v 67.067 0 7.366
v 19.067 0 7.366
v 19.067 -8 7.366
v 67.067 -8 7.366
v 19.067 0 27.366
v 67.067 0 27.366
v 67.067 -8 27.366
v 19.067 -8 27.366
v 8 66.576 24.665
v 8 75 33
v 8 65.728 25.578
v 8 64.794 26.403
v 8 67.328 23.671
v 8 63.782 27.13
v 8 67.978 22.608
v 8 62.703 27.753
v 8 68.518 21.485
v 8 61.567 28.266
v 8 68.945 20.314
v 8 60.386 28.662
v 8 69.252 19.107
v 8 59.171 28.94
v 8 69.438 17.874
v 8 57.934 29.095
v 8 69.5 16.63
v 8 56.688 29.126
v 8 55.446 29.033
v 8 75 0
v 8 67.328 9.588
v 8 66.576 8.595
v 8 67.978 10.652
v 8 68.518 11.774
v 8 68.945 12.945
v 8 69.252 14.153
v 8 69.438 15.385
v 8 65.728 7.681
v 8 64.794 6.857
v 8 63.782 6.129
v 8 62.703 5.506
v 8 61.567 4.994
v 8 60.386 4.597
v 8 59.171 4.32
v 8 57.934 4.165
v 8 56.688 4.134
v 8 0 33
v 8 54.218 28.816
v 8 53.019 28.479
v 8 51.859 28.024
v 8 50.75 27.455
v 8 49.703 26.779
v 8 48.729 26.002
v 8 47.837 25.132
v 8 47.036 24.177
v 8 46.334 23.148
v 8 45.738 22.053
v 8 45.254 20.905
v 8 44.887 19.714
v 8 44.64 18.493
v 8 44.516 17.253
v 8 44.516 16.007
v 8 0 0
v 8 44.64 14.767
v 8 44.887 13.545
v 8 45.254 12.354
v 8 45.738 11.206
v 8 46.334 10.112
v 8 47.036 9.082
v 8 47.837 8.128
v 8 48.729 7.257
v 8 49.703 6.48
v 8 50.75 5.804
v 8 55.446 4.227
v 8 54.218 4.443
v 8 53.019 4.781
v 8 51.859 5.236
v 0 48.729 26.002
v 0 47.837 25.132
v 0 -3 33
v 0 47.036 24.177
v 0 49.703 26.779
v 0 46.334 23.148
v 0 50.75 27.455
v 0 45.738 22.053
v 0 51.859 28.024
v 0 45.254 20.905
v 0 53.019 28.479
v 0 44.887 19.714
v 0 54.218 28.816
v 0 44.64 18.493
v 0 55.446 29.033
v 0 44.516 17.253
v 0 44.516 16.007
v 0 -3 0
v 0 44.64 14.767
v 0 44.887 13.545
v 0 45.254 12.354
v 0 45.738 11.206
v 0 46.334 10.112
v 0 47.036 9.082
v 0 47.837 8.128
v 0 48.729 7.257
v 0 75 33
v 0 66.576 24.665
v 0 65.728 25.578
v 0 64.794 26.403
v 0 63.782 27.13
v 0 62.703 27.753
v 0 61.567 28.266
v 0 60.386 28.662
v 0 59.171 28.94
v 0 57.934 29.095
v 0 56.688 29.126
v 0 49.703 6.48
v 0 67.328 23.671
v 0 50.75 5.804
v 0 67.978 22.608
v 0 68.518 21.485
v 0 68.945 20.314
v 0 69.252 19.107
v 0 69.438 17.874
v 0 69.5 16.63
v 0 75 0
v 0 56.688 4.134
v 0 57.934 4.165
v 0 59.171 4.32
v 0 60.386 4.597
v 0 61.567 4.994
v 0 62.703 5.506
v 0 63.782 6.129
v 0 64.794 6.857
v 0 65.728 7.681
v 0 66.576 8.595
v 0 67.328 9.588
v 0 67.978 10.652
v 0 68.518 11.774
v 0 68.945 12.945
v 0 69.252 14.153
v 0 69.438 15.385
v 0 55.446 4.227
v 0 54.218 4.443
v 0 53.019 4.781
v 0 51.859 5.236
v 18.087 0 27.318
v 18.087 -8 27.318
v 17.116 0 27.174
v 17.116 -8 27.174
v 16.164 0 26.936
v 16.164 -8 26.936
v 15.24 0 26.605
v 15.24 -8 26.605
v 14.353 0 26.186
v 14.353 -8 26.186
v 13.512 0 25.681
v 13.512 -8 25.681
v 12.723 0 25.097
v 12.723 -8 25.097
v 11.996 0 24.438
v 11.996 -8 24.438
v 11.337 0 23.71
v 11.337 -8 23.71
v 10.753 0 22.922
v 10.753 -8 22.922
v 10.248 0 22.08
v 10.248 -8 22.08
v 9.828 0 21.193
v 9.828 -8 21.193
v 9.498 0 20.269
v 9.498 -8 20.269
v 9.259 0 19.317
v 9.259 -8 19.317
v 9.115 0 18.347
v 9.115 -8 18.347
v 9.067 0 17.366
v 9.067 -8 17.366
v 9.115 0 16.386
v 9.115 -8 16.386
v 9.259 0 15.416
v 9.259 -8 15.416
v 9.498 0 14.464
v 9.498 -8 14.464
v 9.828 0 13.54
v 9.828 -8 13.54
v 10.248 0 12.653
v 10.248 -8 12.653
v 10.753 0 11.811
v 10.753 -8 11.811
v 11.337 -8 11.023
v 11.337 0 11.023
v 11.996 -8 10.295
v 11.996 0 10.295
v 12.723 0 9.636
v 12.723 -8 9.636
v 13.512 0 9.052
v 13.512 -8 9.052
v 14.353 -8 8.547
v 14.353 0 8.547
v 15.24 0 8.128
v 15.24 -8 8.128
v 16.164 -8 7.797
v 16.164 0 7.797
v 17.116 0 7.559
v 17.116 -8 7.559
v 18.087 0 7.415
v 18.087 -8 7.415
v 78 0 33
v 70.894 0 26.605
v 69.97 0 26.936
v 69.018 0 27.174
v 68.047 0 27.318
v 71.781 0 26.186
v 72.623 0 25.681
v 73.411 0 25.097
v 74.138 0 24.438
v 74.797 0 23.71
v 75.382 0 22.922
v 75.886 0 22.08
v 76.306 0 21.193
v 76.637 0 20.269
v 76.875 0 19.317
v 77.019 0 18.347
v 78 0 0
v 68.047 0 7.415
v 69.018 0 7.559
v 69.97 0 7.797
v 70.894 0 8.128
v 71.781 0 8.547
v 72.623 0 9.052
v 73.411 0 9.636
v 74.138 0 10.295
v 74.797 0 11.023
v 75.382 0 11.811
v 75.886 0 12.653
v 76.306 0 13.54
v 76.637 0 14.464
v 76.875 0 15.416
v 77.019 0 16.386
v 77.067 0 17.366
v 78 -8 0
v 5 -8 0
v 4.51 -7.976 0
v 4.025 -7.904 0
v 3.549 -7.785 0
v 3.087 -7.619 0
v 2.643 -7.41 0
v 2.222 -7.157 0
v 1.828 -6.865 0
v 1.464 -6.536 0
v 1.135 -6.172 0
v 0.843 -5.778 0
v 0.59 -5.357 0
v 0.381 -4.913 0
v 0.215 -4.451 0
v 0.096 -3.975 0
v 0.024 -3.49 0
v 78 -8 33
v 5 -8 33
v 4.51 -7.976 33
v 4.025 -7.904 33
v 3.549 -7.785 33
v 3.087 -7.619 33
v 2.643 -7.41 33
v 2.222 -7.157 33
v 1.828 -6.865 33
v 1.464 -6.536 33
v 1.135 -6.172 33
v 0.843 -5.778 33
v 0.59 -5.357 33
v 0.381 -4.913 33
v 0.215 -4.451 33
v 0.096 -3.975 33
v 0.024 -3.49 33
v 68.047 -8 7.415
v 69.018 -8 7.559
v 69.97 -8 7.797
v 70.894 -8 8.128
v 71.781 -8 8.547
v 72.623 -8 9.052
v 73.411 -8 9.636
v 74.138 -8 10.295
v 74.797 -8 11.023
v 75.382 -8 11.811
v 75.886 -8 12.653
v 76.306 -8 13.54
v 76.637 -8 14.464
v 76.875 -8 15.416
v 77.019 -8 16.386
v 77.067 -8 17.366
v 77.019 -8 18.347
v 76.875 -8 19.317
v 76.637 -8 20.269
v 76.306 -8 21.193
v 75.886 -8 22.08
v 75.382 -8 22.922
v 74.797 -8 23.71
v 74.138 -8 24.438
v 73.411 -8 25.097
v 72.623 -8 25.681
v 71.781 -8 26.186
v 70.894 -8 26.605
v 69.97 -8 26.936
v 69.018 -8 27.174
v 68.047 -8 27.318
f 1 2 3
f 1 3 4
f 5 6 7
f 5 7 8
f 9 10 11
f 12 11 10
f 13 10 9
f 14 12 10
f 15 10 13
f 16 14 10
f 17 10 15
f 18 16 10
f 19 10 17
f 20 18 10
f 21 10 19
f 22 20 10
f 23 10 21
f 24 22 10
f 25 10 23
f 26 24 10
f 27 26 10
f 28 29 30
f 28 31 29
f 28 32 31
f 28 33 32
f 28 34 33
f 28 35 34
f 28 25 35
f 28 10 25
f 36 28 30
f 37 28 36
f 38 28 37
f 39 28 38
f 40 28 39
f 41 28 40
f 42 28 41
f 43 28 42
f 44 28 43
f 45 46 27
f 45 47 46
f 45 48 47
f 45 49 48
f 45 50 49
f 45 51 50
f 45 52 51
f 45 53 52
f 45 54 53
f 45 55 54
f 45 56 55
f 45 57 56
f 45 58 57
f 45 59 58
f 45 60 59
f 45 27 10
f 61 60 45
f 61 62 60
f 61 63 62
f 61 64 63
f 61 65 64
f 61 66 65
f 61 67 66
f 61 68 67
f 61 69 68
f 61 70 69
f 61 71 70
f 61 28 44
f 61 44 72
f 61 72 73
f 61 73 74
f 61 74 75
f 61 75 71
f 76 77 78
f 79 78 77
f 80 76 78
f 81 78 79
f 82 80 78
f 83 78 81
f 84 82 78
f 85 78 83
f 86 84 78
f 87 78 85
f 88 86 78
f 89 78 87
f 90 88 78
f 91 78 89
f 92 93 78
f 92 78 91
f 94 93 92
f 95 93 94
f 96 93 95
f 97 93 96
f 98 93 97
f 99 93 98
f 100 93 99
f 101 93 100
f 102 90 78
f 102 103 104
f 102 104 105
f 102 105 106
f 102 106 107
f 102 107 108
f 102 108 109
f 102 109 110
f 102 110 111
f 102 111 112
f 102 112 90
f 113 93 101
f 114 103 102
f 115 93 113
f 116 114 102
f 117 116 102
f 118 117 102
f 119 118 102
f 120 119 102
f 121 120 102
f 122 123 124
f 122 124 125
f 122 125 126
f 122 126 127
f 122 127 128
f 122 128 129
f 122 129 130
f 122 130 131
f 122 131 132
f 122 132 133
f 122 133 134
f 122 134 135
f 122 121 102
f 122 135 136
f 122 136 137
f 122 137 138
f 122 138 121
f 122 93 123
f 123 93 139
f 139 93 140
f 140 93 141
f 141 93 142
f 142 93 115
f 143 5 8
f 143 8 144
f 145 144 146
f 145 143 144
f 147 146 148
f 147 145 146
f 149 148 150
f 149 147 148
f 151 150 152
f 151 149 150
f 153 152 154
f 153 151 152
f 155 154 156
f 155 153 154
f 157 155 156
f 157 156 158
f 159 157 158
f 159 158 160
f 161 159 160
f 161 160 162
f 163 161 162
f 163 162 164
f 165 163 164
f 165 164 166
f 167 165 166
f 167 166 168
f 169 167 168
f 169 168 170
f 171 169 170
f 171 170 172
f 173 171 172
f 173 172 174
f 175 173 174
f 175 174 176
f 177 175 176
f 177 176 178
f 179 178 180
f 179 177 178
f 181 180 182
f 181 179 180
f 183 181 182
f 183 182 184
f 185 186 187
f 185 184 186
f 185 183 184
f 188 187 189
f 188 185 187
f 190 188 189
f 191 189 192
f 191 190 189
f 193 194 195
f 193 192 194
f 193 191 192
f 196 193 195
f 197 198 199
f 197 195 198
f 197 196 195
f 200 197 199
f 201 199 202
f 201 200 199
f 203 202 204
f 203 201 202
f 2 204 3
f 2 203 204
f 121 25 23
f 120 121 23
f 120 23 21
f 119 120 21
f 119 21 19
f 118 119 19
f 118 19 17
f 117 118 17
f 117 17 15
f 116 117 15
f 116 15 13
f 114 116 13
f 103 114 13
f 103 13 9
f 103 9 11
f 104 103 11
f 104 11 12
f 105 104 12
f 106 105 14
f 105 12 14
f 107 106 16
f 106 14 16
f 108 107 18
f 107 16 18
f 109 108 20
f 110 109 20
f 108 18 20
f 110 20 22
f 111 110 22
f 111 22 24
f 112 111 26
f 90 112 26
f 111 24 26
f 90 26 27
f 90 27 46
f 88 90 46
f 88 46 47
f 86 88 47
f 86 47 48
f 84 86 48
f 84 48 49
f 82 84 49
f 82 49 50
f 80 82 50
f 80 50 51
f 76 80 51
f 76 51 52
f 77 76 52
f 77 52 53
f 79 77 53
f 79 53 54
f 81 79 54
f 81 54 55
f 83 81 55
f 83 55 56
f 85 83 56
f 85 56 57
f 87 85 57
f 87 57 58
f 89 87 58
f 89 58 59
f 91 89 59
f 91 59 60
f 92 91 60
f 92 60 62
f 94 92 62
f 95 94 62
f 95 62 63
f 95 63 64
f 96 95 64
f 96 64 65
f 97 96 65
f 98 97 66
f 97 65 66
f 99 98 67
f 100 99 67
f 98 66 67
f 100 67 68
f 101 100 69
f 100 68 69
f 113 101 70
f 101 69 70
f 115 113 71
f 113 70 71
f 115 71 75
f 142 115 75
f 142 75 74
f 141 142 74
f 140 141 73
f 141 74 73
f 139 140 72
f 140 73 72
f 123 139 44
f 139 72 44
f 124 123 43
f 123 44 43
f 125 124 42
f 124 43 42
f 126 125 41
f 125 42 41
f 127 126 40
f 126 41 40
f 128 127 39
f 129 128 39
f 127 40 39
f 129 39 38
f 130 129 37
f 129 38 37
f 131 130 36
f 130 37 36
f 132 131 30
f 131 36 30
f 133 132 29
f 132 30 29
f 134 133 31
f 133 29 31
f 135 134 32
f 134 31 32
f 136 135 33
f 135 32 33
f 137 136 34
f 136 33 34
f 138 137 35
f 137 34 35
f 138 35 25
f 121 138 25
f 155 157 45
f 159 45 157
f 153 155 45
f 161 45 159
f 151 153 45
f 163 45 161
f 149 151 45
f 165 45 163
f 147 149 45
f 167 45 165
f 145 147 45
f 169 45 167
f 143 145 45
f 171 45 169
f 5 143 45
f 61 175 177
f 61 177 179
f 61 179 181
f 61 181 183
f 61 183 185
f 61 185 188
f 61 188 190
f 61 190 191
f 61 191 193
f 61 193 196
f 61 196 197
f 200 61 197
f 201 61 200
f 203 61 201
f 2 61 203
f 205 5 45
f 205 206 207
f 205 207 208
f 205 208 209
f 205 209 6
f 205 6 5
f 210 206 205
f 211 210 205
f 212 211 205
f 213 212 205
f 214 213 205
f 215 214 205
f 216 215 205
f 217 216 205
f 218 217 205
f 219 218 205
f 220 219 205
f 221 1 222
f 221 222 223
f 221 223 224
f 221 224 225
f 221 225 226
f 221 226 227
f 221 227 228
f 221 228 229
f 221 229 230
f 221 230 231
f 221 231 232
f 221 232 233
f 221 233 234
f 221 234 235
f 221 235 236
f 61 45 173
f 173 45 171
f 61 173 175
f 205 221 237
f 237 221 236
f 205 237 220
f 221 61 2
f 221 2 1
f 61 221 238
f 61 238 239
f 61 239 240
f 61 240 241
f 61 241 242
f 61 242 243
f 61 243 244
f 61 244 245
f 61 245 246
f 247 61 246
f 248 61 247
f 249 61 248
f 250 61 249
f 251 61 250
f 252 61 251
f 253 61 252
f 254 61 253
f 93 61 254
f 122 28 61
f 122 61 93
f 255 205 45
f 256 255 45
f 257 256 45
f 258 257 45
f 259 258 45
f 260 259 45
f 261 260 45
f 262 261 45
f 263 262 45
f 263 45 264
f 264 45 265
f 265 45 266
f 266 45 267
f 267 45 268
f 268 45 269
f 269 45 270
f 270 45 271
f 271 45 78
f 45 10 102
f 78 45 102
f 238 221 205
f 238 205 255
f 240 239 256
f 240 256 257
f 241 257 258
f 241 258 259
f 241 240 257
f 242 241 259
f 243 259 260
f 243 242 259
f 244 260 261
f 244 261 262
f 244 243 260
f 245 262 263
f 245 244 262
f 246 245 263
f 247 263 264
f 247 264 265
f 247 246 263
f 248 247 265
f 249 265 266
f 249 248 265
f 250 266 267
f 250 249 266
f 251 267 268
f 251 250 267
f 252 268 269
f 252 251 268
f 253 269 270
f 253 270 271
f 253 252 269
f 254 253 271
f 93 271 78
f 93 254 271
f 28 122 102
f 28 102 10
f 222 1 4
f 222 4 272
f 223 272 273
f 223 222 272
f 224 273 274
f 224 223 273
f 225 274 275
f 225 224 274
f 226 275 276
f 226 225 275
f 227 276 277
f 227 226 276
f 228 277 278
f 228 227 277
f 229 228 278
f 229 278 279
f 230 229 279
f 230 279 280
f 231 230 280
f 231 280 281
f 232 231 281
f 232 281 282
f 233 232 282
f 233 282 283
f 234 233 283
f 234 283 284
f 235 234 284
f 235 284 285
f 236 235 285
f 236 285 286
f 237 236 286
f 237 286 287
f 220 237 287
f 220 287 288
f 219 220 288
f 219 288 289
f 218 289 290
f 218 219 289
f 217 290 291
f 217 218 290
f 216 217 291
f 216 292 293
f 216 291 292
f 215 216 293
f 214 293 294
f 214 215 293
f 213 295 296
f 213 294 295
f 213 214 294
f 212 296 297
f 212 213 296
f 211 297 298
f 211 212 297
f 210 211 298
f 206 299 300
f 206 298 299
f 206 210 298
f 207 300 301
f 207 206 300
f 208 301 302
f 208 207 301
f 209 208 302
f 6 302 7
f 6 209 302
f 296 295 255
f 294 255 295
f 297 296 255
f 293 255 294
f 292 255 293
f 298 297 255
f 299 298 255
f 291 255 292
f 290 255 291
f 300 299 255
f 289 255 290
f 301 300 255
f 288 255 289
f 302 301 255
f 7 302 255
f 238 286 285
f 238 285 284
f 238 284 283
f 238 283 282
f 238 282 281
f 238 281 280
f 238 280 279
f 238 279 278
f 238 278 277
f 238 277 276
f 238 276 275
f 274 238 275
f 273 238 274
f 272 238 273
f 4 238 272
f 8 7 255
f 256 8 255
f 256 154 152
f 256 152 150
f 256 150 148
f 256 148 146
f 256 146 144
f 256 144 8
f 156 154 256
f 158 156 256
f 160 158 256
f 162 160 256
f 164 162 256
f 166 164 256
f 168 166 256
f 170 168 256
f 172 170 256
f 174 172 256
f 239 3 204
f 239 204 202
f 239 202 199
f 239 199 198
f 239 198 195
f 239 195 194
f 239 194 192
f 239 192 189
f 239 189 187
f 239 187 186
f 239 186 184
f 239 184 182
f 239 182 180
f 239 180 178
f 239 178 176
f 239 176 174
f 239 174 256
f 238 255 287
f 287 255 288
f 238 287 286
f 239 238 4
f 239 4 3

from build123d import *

# Parameters (mm, degrees)
BOSS_EXTRUDE1_DEPTH = 33
SKETCH2_R           = 12.5
CUT_EXTRUDE2_DEPTH  = 33
CUT_EXTRUDE10_DEPTH = 33


with BuildPart() as part:
    # Sketch1 → Boss-Extrude1 (new body)
    with BuildSketch(Plane.XY):
        with BuildLine():
            Line((0, 0), (0, 75))
            Line((0, 75), (8, 75))
            Line((8, 75), (8, 0))
            Line((8, 0), (78, 0))
            Line((78, 0), (78, -8))
            Line((78, -8), (5, -8))
            ThreePointArc((5, -8), (1.464466094, -6.535533906), (0, -3))
            Line((0, -3), (0, 0))
        make_face()
    extrude(amount=BOSS_EXTRUDE1_DEPTH)

    # Sketch2 → Cut-Extrude2 (cut)
    with BuildSketch(Plane(origin=(8, 0, 0), x_dir=(0, 0, -1), z_dir=(1, 0, 0))):
        with Locations(Location((-16.629694818, 57, 0), (0, 0, 90))):
            Circle(SKETCH2_R)
    extrude(amount=-CUT_EXTRUDE2_DEPTH, mode=Mode.SUBTRACT)

    # Sketch3 → Cut-Extrude10 (cut)
    with BuildSketch(Plane(origin=(0, 0, 0), x_dir=(1, 0, 0), z_dir=(0, 1, 0))):
        with BuildLine():
            Line((19.067260463, -7.366474126), (67.067260463, -7.366474126))
            ThreePointArc((67.067260463, -7.366474126), (77.067260463, -17.366474126), (67.067260463, -27.366474126))
            Line((67.067260463, -27.366474126), (19.067259653, -27.366474126))
            ThreePointArc((19.067259653, -27.366474126), (9.067259653, -17.366473721), (19.067260463, -7.366474126))
        make_face()
    extrude(amount=-CUT_EXTRUDE10_DEPTH, mode=Mode.SUBTRACT)


solid = part.part
